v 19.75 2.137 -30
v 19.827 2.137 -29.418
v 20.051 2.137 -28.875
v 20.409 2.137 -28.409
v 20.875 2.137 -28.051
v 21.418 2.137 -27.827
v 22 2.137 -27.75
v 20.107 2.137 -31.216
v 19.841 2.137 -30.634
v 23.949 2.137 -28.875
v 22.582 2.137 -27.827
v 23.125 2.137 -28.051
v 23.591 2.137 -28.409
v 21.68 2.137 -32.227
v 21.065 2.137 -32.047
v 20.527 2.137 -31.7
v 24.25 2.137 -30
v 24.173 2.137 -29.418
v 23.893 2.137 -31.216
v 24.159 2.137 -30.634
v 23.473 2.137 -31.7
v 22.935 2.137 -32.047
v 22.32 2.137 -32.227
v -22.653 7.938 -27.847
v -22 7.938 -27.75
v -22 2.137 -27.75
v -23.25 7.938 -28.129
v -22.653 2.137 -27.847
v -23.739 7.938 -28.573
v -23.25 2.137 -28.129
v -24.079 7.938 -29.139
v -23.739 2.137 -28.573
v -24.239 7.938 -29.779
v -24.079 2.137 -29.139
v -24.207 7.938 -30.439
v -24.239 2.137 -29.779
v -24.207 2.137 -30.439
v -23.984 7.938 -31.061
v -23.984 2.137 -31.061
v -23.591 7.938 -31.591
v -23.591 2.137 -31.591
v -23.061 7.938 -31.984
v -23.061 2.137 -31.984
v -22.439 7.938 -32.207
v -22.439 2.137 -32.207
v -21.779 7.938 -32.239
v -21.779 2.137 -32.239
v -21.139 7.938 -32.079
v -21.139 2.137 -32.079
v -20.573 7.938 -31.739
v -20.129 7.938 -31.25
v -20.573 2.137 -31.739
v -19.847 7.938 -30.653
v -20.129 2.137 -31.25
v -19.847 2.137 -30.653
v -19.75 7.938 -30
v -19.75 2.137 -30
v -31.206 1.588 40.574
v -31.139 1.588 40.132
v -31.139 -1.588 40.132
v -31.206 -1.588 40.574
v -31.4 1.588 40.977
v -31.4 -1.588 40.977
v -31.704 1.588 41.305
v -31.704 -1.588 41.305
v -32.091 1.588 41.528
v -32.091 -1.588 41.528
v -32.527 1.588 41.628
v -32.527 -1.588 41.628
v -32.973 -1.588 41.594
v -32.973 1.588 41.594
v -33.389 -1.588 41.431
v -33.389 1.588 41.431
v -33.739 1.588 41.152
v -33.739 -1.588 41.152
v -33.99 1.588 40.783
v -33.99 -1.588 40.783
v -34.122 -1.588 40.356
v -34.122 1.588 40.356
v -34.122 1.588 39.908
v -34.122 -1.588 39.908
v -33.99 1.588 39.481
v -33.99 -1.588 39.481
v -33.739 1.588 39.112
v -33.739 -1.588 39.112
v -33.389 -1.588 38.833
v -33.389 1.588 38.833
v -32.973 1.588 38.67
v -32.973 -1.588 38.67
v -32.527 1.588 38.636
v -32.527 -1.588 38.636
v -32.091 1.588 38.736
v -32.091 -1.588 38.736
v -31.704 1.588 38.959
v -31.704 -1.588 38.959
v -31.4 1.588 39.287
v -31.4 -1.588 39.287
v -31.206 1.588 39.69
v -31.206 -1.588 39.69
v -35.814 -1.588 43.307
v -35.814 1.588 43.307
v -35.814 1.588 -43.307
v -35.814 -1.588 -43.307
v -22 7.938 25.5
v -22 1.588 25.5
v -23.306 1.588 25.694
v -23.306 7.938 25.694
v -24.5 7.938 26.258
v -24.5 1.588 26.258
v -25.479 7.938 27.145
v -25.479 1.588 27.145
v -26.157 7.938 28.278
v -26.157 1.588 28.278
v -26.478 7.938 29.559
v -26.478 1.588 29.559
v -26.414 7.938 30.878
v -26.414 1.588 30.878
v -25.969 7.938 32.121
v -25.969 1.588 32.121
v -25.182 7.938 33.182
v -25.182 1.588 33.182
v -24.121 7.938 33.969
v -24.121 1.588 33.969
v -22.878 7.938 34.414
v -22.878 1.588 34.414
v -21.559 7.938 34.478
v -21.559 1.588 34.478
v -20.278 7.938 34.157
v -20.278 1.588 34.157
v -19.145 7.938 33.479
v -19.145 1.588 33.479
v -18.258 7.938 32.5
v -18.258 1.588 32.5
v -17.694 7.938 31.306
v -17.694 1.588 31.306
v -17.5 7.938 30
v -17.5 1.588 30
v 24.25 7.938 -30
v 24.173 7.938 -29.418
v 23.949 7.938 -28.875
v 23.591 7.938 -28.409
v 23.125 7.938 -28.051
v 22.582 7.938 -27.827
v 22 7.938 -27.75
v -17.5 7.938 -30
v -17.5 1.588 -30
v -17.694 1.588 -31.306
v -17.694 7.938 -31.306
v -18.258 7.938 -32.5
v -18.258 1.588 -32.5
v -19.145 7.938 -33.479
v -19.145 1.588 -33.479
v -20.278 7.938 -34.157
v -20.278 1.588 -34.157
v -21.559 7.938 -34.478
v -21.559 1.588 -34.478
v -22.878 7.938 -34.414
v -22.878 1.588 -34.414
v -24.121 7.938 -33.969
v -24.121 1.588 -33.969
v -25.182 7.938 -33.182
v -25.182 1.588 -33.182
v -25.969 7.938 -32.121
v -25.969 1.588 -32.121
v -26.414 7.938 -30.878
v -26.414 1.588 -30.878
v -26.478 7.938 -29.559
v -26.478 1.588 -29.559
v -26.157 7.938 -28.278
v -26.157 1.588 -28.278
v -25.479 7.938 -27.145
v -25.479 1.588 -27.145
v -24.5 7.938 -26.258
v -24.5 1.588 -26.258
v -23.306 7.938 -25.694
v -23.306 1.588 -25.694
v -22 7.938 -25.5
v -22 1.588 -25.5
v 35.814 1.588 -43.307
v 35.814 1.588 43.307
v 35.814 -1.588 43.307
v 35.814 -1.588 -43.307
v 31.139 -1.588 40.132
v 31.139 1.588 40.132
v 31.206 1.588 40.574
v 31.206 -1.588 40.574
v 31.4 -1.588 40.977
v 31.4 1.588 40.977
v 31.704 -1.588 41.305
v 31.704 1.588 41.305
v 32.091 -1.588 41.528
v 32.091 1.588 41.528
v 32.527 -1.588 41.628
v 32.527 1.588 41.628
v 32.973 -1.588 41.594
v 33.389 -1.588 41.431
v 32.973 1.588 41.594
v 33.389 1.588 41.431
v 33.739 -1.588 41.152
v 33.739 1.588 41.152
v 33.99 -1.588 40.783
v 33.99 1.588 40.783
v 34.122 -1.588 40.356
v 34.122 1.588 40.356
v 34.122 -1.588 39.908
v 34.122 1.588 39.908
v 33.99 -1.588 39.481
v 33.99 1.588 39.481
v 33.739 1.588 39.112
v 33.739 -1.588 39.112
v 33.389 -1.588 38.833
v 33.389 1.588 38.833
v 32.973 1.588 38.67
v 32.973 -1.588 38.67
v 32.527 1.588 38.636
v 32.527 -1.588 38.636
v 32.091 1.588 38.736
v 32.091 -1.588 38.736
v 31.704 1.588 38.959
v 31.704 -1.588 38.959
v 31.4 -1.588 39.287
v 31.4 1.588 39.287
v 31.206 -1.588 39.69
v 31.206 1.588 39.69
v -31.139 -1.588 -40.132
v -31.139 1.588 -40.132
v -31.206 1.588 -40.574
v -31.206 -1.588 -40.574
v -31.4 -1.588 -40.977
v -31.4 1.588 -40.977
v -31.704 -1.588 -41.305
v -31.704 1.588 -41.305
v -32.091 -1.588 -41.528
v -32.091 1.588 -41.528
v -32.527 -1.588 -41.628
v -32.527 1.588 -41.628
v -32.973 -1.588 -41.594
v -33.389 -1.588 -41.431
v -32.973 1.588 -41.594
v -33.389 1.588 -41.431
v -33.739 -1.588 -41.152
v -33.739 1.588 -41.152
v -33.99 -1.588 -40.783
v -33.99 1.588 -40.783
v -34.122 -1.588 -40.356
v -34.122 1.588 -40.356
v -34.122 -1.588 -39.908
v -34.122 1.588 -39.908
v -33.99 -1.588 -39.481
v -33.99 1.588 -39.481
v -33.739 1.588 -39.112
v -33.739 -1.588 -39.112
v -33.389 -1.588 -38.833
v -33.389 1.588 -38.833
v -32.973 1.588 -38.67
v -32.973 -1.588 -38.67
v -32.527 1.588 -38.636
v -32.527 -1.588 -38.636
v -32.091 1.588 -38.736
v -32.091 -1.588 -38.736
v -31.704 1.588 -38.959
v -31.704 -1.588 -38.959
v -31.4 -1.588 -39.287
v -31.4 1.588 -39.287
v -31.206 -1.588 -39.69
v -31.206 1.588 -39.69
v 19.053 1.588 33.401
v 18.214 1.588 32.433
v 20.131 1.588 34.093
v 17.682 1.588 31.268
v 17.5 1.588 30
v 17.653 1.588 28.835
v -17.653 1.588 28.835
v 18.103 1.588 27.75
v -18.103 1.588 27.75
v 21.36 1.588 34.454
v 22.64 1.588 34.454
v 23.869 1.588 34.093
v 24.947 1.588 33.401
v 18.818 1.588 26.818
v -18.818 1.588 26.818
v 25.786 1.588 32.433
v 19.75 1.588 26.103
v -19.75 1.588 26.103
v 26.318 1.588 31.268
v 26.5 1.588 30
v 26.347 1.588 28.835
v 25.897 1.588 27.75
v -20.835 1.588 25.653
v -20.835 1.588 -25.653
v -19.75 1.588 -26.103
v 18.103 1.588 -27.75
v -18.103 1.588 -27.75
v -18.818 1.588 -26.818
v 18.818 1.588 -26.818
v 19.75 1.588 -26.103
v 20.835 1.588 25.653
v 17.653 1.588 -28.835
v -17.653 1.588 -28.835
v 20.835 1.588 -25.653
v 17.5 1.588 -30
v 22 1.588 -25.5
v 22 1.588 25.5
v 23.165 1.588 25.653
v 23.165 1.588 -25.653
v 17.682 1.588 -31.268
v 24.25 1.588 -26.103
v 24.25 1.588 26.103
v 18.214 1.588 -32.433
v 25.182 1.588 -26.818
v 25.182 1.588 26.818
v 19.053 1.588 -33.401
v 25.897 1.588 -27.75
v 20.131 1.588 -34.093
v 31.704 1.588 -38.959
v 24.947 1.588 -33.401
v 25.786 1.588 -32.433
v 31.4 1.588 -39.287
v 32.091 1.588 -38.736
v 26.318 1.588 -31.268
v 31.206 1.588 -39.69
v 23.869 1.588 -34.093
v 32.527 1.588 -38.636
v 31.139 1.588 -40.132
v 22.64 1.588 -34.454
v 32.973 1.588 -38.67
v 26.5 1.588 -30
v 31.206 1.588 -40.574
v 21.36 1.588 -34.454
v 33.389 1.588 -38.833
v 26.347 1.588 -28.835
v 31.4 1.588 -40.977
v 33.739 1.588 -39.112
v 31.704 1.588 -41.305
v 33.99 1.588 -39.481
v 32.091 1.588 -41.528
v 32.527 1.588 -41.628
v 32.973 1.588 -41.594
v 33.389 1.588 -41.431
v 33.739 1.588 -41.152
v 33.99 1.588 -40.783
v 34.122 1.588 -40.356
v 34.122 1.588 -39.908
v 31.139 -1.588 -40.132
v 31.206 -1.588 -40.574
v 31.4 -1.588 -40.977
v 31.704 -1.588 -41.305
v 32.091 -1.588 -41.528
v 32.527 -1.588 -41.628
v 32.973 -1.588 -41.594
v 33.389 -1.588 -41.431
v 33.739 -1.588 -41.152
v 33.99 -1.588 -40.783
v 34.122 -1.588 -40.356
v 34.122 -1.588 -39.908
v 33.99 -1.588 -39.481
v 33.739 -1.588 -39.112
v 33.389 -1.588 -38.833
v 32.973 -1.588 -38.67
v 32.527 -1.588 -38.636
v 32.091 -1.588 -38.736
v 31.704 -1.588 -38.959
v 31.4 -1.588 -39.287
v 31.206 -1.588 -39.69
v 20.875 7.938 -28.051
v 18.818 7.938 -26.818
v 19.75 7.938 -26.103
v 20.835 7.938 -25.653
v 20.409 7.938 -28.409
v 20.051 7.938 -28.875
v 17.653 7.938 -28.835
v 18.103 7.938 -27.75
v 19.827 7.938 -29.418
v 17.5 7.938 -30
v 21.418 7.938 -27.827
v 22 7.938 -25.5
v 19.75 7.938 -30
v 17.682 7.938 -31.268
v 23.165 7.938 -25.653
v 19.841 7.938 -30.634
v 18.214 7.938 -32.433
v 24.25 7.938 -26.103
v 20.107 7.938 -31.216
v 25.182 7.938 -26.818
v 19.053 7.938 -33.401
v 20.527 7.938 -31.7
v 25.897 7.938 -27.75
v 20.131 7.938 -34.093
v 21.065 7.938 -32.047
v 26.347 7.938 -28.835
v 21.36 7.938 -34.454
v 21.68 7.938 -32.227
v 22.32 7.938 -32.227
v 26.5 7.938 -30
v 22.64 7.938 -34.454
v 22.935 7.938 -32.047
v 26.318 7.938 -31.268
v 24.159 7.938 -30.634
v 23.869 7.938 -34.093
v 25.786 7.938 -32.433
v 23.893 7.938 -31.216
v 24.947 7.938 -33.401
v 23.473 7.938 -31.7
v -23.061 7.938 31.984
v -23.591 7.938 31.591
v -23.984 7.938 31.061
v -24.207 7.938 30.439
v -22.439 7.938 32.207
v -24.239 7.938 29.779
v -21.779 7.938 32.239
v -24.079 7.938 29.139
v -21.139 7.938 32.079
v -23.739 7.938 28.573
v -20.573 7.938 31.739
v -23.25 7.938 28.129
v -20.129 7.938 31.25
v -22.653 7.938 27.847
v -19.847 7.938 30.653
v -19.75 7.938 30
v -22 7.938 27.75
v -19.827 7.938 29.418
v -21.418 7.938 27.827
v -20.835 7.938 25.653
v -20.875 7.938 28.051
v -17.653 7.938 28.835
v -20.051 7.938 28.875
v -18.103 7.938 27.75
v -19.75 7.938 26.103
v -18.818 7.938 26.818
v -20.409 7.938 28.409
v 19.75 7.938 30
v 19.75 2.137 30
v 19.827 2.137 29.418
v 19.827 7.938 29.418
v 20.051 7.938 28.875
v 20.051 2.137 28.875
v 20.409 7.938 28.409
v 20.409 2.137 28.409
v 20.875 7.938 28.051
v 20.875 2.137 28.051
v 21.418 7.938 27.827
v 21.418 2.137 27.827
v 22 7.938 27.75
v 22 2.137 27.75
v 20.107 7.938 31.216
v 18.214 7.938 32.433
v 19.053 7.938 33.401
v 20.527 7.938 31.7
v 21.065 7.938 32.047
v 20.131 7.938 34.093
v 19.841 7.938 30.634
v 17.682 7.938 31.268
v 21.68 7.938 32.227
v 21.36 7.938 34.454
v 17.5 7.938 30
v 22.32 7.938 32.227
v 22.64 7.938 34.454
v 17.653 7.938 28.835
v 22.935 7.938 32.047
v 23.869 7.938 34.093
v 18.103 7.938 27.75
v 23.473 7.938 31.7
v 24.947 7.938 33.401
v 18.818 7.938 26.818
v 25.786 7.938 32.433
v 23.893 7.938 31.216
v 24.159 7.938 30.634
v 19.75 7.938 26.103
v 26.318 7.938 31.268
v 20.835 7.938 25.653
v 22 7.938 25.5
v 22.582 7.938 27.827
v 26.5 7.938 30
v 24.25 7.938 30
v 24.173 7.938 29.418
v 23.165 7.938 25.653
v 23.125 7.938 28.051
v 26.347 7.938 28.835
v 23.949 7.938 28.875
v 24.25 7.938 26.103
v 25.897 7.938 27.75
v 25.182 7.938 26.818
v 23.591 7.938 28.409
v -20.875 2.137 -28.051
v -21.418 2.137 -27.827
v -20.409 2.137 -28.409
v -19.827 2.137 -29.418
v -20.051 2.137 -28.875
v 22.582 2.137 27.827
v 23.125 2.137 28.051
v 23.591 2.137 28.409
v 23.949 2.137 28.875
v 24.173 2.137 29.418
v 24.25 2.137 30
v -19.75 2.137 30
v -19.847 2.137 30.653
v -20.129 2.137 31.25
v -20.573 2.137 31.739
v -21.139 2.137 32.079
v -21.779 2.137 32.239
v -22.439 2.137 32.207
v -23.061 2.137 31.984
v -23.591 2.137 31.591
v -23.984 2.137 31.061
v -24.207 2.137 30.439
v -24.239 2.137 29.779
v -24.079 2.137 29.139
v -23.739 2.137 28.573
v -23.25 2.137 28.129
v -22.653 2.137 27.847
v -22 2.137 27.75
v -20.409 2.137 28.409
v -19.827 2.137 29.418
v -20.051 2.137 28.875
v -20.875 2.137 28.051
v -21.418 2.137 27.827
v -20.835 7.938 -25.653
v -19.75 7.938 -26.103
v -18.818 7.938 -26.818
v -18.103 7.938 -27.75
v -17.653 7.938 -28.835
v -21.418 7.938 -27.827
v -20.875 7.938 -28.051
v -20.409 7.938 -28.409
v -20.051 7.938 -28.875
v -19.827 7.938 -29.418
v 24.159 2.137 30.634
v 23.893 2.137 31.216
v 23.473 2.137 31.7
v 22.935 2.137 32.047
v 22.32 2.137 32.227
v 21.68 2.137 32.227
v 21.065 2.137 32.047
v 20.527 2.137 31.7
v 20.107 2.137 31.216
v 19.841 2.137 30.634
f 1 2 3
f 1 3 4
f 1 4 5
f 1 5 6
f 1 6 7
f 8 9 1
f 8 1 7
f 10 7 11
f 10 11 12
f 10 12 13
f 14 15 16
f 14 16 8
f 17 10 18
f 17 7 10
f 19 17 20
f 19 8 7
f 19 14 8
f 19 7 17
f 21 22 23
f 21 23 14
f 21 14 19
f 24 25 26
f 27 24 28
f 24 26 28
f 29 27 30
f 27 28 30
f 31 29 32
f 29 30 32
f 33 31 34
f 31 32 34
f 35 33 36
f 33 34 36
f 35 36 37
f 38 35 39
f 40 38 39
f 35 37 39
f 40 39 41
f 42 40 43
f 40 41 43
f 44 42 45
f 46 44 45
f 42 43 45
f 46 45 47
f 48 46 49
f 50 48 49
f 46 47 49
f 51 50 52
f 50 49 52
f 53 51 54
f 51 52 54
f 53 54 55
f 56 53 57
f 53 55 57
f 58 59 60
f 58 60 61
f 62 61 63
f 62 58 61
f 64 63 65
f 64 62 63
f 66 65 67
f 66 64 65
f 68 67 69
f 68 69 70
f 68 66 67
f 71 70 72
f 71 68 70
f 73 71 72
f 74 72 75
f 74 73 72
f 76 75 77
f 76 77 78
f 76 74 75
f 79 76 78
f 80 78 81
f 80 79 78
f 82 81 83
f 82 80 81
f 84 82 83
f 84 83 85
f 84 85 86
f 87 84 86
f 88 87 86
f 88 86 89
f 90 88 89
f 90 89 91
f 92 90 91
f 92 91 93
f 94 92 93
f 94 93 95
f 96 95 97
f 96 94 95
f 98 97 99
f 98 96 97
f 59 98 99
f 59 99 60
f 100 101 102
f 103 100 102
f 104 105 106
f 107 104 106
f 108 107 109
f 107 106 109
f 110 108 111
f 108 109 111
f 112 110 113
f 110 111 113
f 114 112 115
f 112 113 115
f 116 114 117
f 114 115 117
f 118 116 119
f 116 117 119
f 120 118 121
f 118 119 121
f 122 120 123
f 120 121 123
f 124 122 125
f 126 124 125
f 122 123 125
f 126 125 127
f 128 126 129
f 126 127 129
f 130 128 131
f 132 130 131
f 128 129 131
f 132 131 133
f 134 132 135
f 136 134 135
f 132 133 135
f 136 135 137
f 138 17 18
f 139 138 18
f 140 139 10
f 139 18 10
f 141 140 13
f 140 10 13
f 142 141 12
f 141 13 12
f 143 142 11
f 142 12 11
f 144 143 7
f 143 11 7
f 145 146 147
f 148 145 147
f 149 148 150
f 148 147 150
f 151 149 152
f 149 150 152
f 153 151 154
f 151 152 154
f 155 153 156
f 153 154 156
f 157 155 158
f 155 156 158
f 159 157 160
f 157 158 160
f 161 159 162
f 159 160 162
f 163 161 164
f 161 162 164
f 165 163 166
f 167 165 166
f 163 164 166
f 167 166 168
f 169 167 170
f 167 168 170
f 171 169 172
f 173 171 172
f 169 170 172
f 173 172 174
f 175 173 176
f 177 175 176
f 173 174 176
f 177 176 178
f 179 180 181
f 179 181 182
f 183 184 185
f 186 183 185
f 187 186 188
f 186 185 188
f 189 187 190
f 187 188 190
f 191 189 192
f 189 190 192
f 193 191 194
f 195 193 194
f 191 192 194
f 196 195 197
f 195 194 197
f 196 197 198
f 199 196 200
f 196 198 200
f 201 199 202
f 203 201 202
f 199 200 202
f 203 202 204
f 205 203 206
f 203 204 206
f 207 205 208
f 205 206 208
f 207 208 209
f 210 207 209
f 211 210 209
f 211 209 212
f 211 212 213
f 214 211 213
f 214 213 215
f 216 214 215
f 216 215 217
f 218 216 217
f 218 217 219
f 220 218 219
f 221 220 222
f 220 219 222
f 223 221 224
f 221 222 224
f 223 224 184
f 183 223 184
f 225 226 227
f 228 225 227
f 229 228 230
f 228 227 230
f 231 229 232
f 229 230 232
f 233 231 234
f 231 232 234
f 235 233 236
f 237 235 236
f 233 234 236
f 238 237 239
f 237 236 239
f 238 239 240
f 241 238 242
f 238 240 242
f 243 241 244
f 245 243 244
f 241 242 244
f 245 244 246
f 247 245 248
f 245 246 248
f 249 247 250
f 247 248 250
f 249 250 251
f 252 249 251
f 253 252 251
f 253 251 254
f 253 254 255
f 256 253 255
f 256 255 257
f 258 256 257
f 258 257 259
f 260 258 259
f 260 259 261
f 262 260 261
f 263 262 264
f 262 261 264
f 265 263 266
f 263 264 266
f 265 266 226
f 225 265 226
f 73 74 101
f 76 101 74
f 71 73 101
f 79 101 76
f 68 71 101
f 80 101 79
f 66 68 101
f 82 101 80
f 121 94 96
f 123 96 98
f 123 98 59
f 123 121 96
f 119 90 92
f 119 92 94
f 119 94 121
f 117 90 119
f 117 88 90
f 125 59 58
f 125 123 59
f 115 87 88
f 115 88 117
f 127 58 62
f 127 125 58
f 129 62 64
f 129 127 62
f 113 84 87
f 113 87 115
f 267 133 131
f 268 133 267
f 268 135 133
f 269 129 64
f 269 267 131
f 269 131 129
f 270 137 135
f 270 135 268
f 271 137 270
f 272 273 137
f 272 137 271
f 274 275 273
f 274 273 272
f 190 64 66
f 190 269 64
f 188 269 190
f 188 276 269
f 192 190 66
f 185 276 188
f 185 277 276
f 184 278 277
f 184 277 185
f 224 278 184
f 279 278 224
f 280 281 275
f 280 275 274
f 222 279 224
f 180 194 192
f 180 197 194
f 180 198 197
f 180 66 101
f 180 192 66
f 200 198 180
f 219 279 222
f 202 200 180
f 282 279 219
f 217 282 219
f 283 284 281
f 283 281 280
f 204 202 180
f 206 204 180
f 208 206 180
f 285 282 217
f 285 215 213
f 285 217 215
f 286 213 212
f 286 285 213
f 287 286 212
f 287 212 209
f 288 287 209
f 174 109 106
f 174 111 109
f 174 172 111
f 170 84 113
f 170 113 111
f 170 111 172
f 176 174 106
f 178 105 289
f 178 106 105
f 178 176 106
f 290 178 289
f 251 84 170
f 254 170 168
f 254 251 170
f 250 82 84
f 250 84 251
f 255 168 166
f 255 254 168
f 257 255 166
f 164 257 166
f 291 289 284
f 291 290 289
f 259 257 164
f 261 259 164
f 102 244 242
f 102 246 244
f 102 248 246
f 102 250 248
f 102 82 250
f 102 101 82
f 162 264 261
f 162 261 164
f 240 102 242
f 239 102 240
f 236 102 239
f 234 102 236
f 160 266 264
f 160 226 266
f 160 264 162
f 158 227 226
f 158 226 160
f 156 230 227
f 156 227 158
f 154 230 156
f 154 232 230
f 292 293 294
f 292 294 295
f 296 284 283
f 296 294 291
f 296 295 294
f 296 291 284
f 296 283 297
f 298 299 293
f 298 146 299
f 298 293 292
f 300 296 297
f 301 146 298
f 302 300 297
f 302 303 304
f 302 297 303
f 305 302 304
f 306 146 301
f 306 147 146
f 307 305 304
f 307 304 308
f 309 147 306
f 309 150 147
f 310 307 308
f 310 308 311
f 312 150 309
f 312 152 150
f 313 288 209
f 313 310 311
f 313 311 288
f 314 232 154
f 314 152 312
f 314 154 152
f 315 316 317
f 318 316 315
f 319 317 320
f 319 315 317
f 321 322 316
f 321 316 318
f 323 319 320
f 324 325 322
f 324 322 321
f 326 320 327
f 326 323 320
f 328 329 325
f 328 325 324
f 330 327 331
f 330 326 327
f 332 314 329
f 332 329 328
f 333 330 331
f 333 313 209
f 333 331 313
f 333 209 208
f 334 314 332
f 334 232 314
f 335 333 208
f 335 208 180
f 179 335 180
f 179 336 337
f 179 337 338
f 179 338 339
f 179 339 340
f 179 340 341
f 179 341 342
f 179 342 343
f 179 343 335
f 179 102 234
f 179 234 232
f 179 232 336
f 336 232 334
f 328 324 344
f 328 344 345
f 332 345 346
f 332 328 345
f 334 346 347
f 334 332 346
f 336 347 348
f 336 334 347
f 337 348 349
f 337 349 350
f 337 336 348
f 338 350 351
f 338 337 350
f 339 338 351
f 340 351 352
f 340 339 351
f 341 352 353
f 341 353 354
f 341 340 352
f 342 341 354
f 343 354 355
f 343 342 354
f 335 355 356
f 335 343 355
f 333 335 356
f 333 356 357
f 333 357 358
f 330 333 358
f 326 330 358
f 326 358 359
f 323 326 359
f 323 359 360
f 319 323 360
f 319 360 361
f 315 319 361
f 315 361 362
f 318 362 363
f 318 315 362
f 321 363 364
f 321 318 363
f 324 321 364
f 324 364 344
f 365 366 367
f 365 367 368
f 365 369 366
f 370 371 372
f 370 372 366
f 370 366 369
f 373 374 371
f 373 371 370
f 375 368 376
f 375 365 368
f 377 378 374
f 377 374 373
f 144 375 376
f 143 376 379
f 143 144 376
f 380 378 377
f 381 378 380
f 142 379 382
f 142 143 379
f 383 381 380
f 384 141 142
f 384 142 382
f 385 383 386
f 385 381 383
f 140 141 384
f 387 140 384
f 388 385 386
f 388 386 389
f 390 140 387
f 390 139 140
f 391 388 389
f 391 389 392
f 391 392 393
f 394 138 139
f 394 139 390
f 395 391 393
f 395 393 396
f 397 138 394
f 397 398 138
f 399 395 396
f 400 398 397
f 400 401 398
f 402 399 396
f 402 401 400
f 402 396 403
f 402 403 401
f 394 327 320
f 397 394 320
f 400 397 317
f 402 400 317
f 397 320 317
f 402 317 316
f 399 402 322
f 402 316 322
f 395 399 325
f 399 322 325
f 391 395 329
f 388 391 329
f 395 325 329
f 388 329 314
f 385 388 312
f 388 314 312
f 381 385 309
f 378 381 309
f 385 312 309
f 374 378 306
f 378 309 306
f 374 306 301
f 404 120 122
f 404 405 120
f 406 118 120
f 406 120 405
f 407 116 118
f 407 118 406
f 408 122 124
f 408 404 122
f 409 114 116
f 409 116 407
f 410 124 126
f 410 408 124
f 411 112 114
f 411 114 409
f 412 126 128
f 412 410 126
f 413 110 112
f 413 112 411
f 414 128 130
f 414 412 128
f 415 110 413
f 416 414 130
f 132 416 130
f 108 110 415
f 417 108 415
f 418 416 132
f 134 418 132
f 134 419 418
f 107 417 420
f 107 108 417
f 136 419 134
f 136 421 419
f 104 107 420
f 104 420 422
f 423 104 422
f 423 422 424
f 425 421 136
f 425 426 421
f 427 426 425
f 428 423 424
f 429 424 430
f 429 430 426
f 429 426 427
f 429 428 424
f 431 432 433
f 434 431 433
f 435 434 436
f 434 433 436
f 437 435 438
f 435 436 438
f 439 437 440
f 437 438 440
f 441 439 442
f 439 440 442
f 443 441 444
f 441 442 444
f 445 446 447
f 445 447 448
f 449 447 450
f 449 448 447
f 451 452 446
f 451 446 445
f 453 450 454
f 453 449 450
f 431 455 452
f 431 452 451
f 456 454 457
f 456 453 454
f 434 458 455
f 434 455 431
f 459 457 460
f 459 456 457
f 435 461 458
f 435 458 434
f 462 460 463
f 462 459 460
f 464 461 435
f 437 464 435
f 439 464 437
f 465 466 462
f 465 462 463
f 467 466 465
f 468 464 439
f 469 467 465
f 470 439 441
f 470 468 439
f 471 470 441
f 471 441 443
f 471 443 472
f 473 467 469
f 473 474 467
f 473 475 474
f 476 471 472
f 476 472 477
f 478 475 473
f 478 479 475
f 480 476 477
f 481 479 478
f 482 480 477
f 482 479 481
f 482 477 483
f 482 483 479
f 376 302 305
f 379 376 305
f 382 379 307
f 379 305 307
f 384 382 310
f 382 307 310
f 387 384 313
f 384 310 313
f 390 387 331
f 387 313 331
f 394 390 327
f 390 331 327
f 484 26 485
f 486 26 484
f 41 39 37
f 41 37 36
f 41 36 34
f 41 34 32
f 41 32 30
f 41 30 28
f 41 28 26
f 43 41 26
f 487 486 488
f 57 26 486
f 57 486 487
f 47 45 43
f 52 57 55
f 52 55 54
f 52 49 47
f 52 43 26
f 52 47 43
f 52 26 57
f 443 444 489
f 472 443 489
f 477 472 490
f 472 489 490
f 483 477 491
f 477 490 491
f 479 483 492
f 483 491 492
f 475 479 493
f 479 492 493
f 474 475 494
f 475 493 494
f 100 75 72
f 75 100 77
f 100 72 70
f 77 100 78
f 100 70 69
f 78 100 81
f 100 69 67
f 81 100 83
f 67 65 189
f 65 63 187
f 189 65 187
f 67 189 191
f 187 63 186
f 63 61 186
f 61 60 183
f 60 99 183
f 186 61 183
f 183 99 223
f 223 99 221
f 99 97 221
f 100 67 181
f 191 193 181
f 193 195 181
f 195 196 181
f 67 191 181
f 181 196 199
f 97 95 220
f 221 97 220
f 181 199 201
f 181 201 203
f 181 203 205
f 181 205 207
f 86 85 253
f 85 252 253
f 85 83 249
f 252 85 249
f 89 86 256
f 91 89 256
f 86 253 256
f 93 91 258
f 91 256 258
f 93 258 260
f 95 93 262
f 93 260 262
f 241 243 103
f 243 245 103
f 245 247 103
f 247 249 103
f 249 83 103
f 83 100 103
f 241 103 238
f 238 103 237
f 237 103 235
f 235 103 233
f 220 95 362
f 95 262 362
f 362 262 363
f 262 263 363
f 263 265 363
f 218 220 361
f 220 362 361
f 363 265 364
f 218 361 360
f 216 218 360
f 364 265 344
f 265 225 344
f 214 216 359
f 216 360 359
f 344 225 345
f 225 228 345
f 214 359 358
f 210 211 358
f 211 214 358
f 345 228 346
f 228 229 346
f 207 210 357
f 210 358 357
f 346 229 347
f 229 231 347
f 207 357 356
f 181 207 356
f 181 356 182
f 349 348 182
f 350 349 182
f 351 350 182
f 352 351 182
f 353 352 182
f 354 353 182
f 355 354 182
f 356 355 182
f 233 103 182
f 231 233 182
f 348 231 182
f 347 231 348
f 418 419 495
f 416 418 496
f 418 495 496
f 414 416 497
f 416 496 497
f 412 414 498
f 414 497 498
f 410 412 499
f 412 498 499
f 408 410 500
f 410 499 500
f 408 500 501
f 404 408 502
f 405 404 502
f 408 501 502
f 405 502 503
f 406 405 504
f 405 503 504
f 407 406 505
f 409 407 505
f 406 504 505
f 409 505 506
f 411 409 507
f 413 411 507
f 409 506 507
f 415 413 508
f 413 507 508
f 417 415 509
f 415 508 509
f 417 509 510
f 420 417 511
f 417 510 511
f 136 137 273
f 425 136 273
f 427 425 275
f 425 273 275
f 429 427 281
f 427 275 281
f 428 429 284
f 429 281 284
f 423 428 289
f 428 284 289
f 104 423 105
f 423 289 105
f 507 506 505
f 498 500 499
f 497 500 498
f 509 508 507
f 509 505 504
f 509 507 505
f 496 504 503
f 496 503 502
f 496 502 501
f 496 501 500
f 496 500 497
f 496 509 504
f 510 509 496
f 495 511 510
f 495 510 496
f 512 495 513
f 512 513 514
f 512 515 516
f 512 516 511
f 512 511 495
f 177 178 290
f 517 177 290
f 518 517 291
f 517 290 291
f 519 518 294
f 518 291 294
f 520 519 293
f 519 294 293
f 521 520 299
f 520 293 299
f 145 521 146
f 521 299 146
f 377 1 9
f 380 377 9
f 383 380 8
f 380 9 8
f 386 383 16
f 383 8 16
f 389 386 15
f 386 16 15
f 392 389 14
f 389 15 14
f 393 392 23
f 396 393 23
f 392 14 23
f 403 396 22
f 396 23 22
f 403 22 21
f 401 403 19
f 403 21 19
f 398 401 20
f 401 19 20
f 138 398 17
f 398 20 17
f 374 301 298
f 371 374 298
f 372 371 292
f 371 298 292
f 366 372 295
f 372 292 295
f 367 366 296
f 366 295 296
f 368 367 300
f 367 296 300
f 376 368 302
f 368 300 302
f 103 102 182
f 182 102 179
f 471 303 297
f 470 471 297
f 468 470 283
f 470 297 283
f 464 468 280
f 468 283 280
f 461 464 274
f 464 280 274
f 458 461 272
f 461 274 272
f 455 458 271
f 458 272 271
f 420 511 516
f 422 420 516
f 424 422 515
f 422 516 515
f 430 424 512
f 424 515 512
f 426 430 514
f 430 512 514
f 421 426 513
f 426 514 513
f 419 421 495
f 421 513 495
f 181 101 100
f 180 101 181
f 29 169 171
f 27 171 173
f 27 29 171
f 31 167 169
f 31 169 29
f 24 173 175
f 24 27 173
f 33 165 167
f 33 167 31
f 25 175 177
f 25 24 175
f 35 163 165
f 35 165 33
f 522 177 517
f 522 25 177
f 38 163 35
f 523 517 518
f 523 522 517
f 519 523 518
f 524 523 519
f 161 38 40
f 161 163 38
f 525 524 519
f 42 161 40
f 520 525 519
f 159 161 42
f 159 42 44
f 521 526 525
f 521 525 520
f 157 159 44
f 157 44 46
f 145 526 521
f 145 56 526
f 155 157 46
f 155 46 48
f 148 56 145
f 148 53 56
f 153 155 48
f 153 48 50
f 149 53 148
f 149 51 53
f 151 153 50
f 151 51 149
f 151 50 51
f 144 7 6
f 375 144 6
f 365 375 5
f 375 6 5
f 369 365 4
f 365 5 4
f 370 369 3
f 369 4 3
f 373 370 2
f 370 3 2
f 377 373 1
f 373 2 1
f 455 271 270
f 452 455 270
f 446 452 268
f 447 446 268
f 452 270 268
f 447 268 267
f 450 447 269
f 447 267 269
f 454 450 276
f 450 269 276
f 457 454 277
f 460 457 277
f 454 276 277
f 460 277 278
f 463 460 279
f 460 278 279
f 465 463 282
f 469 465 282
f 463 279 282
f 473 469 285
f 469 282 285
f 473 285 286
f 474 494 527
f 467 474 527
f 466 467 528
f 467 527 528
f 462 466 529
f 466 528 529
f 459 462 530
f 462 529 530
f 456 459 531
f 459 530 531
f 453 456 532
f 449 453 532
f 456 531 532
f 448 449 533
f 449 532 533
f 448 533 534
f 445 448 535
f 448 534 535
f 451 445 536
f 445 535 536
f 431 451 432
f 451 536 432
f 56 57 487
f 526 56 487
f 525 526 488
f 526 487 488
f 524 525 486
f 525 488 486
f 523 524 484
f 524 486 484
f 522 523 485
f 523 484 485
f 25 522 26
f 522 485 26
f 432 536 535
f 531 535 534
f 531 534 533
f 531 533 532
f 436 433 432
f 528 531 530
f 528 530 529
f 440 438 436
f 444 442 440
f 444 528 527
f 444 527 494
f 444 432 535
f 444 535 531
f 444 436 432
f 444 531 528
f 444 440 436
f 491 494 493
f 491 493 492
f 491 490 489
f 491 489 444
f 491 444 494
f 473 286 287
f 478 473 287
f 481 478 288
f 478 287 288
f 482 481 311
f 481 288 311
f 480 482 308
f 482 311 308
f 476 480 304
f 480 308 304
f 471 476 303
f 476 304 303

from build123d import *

# Parameters (mm, degrees)
SKETCH2_W                                  = 71.628
SKETCH2_H                                  = 86.614
BOSS_EXTRUDE1_DEPTH                        = 1.5875
CUT_EXTRUDE1_REACH                         = 58.287
SKETCH3_R                                  = 1.5
MIRROR1_AT_THE_SECOND_PLANE_COPY_1_REACH   = 58.287
MIRROR1_AT_THE_SECOND_PLANE_COPY_1_SKETC_R = 1.5
SKETCH4_R                                  = 4.500000017
SKETCH4_R_2                                = 2.2499955
BOSS_EXTRUDE2_DEPTH                        = 6.35
SKETCH4_3_R                                = 2.2499955
BOSS_EXTRUDE3_DEPTH                        = 0.549999916


with BuildPart() as part:
    # Sketch2 → Boss-Extrude1 (new, symmetric)
    with BuildSketch(Plane(origin=(0, 0, 0), x_dir=(1, 0, 0), z_dir=(0, 1, 0))):
        Rectangle(SKETCH2_W, SKETCH2_H)
    extrude(amount=BOSS_EXTRUDE1_DEPTH, both=True)

    # Sketch3 → Cut-Extrude1 (cut, up to next)
    with BuildSketch(Plane(origin=(0, 1.5875, 0), x_dir=(1, 0, 0), z_dir=(0, 1, 0)), mode=Mode.PRIVATE) as cut_extrude1_sk1:
        with Locations((-32.639, 40.132)):
            Circle(SKETCH3_R)
    cut_extrude1_tool1 = extrude(cut_extrude1_sk1.sketch, amount=-CUT_EXTRUDE1_REACH, mode=Mode.PRIVATE) & part.part
    cut_extrude1 = cut_extrude1_tool1.solids().sort_by_distance((-32.639, 1.5875, -40.132))[0]
    add(cut_extrude1, mode=Mode.SUBTRACT)

    # Mirror1: Cut-Extrude1 across plane
    add(cut_extrude1.mirror(Plane(origin=(0, 0, 0), x_dir=(0, 0, 1), z_dir=(1, 0, 0))), mode=Mode.SUBTRACT)

    # Mirror1 at the second plane: Cut-Extrude1 across plane
    add(cut_extrude1.mirror(Plane.XY), mode=Mode.SUBTRACT)

    # Mirror1 at the second plane copy 1 sketc → Mirror1 at the second plane copy 1 (cut, up to next)
    with BuildSketch(Plane(origin=(0, 1.5875, 0), x_dir=(-1, 0, 0), z_dir=(0, 1, 0)), mode=Mode.PRIVATE) as mirror1_at_the_second_plane_copy_1_sk1:
        with Locations((-32.639, 40.132)):
            Circle(MIRROR1_AT_THE_SECOND_PLANE_COPY_1_SKETC_R)
    mirror1_at_the_second_plane_copy_1_tool1 = extrude(mirror1_at_the_second_plane_copy_1_sk1.sketch, amount=-MIRROR1_AT_THE_SECOND_PLANE_COPY_1_REACH, mode=Mode.PRIVATE) & part.part
    add(mirror1_at_the_second_plane_copy_1_tool1.solids().sort_by_distance((32.639, 1.5875, 40.132))[0], mode=Mode.SUBTRACT)

    # Sketch4 → Boss-Extrude2 (add)
    # profile 1 of 4: a face of its own
    with BuildSketch(Plane(origin=(0, 1.5875, 0), x_dir=(1, 0, 0), z_dir=(0, 1, 0))):
        with Locations((-22, 30)):
            Circle(SKETCH4_R)
        with Locations((-22, 30)):
            Circle(SKETCH4_R_2, mode=Mode.SUBTRACT)
    # profile 2 of 4: a face of its own
    with BuildSketch(Plane(origin=(0, 1.5875, 0), x_dir=(1, 0, 0), z_dir=(0, 1, 0))):
        with Locations((22, 30)):
            Circle(SKETCH4_R)
        with Locations((22, 30)):
            Circle(SKETCH4_R_2, mode=Mode.SUBTRACT)
    # profile 3 of 4: a face of its own
    with BuildSketch(Plane(origin=(0, 1.5875, 0), x_dir=(1, 0, 0), z_dir=(0, 1, 0))):
        with Locations((-22, -30)):
            Circle(SKETCH4_R)
        with Locations((-22, -30)):
            Circle(SKETCH4_R_2, mode=Mode.SUBTRACT)
    # profile 4 of 4: a face of its own
    with BuildSketch(Plane(origin=(0, 1.5875, 0), x_dir=(1, 0, 0), z_dir=(0, 1, 0))):
        with Locations((22, -30)):
            Circle(SKETCH4_R)
        with Locations((22, -30)):
            Circle(SKETCH4_R_2, mode=Mode.SUBTRACT)
    extrude(amount=BOSS_EXTRUDE2_DEPTH)

    # Sketch4<3> → Boss-Extrude3 (add)
    with BuildSketch(Plane(origin=(0, 1.5875, 0), x_dir=(1, 0, 0), z_dir=(0, 1, 0))):
        with Locations((-22, 30)):
            Circle(SKETCH4_3_R)
        with Locations((22, 30)):
            Circle(SKETCH4_3_R)
        with Locations((-22, -30)):
            Circle(SKETCH4_3_R)
        with Locations((22, -30)):
            Circle(SKETCH4_3_R)
    extrude(amount=BOSS_EXTRUDE3_DEPTH)


solid = part.part
